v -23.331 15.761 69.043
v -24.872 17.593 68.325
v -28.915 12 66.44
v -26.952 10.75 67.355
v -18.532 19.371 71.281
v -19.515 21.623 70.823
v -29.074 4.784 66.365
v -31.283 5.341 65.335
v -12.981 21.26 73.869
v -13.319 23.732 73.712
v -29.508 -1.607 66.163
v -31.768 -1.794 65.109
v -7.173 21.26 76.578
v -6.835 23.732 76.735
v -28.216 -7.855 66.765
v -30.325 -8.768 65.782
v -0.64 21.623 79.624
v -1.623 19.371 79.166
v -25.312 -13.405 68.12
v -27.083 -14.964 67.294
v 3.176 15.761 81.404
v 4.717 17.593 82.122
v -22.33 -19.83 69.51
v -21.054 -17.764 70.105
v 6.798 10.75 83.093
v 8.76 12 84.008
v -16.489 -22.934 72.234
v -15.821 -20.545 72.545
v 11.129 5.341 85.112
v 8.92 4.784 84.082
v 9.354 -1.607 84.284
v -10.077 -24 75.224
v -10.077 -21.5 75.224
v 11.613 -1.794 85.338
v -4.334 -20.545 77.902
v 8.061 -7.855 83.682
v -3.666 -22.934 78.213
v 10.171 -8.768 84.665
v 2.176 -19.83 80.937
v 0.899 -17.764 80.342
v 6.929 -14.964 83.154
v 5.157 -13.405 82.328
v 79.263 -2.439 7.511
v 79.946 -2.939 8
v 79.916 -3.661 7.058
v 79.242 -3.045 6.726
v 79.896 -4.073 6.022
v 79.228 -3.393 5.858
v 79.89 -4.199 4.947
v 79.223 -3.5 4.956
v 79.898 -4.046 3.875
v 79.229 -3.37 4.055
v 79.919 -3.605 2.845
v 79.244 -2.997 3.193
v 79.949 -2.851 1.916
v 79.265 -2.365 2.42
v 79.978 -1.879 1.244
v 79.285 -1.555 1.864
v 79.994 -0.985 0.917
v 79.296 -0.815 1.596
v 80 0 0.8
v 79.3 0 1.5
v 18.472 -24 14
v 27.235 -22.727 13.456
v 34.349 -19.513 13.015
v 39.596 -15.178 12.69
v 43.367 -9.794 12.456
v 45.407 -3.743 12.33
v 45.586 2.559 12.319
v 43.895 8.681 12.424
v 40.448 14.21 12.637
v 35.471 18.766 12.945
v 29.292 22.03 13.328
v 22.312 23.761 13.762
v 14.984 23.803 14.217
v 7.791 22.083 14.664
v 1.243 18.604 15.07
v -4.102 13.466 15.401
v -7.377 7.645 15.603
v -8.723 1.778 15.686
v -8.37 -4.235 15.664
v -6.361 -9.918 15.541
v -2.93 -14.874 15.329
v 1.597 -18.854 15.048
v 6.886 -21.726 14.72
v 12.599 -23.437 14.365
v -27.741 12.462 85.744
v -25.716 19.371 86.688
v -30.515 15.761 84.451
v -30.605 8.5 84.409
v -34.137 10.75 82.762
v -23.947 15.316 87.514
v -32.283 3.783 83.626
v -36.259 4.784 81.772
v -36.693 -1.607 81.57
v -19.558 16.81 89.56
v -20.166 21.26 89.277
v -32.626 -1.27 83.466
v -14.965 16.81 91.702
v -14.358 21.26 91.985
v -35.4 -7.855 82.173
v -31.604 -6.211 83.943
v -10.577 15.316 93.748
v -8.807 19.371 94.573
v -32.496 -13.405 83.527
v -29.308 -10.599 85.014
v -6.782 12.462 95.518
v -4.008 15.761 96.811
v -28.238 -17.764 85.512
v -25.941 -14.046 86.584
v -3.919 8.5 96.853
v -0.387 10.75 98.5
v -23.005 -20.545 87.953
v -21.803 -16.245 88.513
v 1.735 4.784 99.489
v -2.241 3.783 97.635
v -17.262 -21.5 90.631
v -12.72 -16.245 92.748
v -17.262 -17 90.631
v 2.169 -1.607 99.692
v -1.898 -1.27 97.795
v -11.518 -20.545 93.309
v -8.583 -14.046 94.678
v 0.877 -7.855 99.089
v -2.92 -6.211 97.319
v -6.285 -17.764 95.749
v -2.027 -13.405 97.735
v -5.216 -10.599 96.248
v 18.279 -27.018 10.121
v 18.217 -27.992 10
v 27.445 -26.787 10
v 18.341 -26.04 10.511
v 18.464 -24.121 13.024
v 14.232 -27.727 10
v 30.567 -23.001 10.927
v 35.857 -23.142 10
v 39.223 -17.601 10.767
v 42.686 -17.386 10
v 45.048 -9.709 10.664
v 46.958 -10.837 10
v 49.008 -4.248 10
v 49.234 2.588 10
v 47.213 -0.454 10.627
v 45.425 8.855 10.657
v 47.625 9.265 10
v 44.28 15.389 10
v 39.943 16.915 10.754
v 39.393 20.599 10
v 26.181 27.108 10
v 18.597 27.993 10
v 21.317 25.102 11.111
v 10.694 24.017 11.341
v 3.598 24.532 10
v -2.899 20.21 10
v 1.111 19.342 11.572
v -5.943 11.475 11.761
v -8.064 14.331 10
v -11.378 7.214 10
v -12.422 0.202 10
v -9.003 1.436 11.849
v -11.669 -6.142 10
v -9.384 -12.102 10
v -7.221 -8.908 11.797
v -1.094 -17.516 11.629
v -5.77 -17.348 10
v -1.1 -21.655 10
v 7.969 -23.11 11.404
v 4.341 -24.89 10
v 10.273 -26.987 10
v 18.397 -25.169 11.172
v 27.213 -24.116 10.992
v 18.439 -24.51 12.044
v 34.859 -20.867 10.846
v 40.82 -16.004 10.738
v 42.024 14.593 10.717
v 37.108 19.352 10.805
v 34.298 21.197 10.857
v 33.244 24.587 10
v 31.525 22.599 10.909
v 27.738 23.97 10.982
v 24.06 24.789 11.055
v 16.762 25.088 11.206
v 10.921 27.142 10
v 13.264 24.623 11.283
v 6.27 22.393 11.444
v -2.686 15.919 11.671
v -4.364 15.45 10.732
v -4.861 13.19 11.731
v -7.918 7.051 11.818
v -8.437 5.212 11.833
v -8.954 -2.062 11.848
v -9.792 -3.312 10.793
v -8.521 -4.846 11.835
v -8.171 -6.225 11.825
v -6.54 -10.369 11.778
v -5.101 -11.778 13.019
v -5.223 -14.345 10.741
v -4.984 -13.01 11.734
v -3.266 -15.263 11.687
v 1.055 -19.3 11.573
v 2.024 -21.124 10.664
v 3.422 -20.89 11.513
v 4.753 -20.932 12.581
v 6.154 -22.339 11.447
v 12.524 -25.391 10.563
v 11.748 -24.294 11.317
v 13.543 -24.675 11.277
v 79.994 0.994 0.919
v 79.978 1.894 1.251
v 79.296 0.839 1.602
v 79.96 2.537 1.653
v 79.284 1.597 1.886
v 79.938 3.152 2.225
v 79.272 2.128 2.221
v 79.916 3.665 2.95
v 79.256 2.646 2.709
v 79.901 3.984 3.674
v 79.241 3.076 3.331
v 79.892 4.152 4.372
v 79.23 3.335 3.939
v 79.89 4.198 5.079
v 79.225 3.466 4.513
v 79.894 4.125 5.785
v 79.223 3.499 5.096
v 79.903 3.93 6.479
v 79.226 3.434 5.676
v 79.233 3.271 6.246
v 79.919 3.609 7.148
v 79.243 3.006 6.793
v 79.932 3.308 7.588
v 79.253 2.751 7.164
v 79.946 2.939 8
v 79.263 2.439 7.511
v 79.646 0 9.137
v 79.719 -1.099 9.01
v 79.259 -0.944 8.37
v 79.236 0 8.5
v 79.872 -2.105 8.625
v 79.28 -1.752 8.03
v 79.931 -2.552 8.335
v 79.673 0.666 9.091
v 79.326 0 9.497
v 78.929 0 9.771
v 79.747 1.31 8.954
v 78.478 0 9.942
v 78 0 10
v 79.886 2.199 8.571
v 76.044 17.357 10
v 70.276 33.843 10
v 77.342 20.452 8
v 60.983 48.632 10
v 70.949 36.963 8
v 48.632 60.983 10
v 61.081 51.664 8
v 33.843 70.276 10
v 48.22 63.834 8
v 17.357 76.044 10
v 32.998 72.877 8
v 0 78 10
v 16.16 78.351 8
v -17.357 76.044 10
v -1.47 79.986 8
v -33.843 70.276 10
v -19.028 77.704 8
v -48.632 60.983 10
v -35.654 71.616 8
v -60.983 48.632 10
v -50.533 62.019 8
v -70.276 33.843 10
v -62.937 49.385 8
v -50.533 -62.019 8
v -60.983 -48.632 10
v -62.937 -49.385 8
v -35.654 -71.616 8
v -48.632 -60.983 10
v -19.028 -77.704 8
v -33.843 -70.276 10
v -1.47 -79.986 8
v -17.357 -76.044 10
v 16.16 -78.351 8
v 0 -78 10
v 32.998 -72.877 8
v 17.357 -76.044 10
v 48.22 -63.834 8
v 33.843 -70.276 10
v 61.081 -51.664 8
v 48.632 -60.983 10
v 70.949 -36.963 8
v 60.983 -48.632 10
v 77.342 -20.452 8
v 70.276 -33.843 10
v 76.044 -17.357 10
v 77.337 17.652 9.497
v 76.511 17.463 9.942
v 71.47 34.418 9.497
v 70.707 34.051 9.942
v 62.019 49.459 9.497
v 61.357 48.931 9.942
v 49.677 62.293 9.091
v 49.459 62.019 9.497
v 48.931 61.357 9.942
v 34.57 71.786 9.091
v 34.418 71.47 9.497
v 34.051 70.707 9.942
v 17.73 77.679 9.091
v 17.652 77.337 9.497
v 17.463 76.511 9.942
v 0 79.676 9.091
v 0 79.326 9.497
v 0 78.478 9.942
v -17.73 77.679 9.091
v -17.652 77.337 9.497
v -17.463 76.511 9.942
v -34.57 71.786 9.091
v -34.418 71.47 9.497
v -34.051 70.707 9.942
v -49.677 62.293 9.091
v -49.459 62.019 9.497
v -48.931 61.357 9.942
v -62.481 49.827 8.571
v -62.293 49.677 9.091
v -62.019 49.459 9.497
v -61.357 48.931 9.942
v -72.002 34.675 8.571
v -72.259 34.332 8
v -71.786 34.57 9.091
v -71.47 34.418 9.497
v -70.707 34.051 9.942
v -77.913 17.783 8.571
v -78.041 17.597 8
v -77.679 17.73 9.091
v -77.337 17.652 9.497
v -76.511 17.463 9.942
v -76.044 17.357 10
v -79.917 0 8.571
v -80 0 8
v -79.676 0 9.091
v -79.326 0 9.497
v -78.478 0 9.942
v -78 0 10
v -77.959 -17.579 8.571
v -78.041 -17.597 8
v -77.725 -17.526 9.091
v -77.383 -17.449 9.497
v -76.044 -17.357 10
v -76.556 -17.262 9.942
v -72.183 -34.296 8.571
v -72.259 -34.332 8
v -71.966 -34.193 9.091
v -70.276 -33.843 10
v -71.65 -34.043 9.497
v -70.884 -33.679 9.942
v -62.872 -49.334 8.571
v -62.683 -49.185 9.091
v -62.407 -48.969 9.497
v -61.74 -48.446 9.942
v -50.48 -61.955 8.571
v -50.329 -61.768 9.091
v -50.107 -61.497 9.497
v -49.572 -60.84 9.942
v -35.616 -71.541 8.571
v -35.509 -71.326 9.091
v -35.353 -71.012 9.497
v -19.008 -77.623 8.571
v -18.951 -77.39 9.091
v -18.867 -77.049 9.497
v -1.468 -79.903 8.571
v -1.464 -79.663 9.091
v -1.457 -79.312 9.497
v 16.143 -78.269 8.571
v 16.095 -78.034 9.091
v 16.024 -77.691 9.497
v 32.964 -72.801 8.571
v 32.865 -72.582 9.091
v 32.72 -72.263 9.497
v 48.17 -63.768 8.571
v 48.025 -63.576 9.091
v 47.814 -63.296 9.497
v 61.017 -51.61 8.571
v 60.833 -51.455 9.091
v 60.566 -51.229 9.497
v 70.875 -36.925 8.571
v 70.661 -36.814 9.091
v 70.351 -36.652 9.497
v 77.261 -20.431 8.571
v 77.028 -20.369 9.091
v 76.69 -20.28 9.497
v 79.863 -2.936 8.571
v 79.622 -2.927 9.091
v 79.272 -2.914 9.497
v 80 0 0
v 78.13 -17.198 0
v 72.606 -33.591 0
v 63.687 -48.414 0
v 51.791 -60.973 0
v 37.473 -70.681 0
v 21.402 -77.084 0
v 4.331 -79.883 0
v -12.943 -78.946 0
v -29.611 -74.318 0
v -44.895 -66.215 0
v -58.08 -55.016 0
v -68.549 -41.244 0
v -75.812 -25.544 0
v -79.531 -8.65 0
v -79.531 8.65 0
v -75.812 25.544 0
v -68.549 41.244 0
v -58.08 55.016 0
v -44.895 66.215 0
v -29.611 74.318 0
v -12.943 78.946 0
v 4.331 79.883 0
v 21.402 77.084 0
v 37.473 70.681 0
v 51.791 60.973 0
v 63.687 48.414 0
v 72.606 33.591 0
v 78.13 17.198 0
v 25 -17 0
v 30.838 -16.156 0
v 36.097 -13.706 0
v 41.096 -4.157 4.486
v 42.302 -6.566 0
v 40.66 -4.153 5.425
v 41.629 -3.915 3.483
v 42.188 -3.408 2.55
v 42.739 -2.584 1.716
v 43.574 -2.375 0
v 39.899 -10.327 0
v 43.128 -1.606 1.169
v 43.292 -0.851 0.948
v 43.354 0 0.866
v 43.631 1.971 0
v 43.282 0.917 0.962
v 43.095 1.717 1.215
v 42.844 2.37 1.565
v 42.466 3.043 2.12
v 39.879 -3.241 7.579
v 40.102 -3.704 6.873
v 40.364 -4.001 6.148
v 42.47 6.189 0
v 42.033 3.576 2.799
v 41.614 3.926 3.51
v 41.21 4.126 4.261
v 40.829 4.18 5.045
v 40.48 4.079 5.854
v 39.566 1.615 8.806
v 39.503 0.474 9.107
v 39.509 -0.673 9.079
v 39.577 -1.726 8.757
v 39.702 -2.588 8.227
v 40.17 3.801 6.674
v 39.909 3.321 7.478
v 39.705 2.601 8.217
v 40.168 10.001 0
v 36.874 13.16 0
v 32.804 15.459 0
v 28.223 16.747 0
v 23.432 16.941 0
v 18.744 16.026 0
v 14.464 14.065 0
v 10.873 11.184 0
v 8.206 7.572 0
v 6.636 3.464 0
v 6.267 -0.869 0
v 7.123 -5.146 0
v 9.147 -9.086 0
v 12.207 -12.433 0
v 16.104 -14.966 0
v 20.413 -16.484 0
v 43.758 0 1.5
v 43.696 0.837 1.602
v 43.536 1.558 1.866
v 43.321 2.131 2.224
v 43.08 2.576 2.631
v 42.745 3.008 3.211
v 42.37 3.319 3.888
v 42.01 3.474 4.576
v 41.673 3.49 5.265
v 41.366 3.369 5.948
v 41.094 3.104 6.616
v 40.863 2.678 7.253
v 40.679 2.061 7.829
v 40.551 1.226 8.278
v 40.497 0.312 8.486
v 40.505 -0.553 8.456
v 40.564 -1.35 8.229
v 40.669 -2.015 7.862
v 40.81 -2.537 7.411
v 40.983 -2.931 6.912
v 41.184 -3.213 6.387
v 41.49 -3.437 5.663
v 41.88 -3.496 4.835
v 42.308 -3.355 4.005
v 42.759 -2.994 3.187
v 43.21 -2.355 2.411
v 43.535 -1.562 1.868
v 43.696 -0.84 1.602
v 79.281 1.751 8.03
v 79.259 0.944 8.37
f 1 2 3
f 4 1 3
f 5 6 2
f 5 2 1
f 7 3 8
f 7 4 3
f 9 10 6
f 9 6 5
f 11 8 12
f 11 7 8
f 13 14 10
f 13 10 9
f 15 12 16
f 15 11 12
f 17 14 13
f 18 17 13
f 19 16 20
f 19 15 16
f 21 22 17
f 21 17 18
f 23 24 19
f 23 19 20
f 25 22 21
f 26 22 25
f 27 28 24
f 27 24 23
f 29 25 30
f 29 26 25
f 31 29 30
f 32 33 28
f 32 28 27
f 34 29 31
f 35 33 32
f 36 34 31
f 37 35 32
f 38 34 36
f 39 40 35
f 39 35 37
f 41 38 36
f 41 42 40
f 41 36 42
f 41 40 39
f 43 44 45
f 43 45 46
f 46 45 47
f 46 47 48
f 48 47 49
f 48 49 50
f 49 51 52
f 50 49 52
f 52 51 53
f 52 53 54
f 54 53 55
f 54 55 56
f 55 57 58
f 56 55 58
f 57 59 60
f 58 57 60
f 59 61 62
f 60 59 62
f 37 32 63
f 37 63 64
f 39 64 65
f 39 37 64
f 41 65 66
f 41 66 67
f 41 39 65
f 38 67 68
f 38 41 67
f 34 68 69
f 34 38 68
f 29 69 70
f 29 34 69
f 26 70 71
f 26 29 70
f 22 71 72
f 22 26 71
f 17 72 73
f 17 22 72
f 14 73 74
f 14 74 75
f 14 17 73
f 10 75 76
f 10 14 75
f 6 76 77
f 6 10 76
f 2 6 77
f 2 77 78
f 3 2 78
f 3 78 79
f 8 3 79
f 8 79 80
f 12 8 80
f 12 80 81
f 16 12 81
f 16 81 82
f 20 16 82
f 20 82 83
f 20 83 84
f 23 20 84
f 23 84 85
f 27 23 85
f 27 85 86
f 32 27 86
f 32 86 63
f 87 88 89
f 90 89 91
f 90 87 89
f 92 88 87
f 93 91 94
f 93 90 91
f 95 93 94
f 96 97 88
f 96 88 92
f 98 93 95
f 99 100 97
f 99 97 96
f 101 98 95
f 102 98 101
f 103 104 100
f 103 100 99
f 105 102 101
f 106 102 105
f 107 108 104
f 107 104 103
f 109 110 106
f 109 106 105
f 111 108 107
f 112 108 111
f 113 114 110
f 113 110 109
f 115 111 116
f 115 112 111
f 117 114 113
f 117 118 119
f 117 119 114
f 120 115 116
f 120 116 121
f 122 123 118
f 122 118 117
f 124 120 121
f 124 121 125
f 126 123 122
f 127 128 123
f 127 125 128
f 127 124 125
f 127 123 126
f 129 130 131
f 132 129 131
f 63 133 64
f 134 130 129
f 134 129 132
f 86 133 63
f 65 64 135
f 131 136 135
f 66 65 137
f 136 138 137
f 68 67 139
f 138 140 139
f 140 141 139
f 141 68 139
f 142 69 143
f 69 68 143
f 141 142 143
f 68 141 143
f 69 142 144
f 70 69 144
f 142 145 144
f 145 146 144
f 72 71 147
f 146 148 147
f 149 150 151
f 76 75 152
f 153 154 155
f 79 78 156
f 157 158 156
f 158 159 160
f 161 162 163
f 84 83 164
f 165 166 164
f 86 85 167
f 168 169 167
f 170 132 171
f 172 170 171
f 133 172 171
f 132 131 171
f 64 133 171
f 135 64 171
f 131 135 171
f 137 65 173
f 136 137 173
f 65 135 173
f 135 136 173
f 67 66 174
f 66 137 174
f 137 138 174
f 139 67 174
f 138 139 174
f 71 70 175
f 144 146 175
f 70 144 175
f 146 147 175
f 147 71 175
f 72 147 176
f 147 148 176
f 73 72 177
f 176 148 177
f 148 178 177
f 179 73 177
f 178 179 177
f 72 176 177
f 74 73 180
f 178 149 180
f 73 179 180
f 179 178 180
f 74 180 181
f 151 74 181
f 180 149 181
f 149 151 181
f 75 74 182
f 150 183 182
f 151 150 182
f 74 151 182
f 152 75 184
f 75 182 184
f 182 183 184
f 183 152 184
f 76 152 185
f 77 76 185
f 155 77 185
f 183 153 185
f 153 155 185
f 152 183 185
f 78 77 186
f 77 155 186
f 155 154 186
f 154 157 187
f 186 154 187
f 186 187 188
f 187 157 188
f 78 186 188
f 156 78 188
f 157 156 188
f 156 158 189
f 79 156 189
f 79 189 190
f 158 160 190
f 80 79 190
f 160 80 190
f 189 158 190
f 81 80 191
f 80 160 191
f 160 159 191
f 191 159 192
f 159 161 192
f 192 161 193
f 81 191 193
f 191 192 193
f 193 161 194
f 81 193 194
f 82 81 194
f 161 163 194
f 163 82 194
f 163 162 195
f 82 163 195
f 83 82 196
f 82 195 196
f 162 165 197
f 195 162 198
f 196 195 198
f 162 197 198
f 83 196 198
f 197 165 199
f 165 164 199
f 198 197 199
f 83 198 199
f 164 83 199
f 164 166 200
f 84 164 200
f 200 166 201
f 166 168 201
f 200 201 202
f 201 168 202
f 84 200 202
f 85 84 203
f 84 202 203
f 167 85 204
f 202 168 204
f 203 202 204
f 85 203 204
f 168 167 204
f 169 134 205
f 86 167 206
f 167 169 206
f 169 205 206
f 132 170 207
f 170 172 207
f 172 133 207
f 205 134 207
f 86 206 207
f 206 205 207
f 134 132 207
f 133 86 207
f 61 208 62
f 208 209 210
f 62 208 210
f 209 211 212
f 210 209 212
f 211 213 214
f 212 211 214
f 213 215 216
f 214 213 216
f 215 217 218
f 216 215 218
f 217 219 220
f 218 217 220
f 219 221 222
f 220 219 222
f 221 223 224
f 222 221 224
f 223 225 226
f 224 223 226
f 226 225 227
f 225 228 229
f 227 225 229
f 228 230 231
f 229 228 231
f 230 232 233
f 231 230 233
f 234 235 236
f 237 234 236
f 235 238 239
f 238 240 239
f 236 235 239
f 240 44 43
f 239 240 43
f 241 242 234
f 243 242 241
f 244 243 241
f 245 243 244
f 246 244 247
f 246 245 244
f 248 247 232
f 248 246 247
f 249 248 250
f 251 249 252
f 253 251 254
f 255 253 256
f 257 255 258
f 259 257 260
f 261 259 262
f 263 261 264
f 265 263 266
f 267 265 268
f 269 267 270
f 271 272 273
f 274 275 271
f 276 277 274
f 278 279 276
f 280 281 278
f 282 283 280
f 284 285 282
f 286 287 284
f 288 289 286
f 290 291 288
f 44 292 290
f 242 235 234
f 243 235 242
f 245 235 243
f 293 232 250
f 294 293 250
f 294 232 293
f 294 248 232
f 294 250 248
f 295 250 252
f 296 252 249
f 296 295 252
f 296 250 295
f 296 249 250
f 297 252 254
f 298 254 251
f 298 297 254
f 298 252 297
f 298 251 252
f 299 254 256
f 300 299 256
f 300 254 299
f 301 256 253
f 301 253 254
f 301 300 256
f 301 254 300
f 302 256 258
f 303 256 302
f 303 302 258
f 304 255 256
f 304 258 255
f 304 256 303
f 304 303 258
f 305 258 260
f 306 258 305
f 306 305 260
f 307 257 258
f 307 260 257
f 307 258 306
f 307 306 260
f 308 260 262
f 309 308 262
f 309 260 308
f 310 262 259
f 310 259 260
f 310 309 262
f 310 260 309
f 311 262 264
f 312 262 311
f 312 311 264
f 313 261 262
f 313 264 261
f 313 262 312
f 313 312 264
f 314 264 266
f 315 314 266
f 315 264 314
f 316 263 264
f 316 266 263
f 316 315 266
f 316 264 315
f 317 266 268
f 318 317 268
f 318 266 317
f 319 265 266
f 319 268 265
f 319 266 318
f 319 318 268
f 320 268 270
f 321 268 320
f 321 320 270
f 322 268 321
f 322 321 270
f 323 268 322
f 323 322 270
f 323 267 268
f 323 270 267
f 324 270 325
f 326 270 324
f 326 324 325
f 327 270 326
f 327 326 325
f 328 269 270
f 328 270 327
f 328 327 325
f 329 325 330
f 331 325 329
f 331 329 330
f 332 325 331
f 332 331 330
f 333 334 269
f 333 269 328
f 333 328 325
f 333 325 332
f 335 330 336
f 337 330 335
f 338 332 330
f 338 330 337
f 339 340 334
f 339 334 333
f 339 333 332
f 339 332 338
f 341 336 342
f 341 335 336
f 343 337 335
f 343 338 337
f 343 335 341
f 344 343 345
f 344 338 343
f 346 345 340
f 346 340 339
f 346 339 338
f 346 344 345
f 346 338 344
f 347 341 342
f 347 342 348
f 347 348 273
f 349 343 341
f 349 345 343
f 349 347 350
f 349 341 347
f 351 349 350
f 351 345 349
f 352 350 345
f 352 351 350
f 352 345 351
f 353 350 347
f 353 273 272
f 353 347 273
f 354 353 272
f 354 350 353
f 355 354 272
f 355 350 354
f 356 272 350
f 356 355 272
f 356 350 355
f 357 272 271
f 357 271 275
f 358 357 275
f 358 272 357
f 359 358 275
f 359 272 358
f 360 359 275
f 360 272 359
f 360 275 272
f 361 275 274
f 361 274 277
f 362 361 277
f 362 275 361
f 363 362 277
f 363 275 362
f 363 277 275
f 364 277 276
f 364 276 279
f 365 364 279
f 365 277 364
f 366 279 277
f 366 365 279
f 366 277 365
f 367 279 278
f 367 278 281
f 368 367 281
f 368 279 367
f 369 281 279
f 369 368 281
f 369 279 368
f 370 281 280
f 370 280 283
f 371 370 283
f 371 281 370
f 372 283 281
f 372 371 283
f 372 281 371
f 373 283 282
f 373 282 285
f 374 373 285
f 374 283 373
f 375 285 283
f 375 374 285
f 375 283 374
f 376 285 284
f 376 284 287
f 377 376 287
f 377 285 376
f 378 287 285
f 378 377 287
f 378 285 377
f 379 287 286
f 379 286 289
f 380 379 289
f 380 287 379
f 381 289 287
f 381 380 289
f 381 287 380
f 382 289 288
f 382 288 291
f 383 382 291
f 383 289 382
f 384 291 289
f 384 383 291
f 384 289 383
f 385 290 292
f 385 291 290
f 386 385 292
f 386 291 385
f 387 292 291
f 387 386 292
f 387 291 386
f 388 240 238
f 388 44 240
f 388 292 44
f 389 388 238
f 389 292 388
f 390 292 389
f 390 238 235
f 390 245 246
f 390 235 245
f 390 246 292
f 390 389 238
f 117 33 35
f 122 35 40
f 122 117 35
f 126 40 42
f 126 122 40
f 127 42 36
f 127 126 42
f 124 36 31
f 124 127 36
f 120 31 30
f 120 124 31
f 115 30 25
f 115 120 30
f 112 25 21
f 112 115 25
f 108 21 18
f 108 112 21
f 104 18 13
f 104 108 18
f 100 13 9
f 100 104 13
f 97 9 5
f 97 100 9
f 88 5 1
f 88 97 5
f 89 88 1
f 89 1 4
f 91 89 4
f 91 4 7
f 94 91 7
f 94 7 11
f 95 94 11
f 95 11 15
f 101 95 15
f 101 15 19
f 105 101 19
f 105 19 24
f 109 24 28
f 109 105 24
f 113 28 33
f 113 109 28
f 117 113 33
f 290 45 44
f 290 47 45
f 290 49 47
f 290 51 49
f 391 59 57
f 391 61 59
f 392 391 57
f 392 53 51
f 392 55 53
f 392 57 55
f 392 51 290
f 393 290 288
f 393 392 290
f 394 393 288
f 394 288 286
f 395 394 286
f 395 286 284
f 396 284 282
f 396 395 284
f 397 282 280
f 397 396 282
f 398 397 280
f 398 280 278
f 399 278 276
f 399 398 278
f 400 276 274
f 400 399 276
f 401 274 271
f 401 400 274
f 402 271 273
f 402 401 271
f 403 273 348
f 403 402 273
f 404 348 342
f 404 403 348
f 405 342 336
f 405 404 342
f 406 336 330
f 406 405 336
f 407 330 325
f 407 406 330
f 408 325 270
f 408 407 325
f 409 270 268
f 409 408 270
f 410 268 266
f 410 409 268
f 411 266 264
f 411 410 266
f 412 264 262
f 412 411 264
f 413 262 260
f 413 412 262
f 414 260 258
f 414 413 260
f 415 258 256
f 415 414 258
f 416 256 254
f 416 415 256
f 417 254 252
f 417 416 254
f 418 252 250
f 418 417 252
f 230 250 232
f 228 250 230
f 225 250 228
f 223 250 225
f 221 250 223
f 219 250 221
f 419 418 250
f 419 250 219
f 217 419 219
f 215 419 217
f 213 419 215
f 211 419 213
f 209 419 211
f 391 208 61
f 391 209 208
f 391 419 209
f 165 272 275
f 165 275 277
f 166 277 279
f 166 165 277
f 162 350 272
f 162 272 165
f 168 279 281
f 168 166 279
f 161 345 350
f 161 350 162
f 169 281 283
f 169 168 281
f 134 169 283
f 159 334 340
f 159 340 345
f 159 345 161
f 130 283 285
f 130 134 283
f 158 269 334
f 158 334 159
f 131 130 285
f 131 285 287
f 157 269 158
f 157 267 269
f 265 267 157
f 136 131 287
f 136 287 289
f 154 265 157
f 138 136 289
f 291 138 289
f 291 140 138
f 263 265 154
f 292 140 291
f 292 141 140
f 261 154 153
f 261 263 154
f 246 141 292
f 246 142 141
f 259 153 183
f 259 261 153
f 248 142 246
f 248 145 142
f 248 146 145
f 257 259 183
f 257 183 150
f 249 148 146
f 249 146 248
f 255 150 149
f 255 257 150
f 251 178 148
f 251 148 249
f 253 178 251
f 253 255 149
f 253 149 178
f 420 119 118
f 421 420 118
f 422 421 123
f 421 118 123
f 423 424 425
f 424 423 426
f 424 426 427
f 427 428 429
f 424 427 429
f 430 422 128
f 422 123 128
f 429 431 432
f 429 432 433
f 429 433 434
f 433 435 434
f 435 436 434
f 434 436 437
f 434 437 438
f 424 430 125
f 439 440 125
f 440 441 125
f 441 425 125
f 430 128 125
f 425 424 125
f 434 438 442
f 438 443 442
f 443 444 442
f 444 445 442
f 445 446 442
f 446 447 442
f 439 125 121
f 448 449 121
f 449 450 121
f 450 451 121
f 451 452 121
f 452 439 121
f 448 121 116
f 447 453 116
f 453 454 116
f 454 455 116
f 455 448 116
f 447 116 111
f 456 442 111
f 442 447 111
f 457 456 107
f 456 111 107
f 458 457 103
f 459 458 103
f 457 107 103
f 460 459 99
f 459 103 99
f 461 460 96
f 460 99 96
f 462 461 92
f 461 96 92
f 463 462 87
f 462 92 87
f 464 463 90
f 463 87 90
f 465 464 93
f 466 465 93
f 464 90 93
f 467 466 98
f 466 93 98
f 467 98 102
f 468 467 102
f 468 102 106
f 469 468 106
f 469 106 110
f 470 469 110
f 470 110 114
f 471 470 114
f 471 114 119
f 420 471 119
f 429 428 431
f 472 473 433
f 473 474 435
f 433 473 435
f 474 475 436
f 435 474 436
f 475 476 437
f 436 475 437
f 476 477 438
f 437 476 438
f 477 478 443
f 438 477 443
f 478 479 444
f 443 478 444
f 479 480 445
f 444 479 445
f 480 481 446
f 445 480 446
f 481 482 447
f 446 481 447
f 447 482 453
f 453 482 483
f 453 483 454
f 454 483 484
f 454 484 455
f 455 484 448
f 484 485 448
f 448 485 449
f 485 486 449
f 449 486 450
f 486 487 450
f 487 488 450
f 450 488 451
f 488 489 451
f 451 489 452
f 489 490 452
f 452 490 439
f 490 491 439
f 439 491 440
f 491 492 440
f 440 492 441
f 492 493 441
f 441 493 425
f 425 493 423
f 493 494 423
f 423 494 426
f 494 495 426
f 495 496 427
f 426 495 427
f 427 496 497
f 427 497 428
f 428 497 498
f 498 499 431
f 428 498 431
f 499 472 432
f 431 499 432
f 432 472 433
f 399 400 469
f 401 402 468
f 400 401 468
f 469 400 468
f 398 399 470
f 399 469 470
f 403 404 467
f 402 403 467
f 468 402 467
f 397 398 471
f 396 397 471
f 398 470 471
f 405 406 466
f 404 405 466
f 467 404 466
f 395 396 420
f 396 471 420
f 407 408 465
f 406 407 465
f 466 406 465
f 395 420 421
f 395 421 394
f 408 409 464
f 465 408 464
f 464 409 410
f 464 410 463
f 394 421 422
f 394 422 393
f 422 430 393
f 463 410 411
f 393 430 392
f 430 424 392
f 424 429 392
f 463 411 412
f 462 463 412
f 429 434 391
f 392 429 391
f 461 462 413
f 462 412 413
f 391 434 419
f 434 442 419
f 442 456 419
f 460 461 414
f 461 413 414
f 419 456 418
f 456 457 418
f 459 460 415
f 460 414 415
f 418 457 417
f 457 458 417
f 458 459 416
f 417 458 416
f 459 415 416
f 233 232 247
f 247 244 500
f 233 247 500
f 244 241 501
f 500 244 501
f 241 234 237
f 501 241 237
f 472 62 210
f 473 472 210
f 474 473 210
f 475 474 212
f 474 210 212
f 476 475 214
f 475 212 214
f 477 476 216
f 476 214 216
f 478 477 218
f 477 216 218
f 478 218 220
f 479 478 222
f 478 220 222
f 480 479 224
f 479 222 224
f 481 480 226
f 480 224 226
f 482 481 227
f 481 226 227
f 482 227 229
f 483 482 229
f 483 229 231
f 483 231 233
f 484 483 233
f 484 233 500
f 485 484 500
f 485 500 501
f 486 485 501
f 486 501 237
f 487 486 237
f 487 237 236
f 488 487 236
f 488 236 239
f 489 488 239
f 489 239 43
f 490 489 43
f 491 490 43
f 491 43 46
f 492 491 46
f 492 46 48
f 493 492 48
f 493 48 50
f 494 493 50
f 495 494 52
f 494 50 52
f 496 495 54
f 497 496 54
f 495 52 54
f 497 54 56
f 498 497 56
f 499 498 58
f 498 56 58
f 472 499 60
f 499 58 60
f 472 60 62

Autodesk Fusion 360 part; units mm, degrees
sketch "Skizze13" plane through (0, 0, 0) normal (0, 0, 1) x (1, 0, 0)
  circle A0 centre (0, 0) radius 80
extrude "Extrusion17" add sketch "Skizze13" along normal blind 10 makes body 1
fillet "Abrundung5" radius 2 1 edges at (-74.5862, -28.9292, 10) on bodies 1
sketch "Skizze14" plane through (0, 0, 0) normal (0, 1, 0) x (1, 0, 0)
  line L0 (25, 0) -> (-17.2618, -90.6308) construction
ref_plane "Arbeitsebene5" through (-17.2618, 0, 90.6308) normal (-0.4226, 0, 0.9063) x (0, -1, 0)
sketch "Skizze15" plane through (-17.2618, 0, 90.6308) normal (-0.4226, 0, 0.9063) x (0, -1, 0)
  circle A0 centre (0, 0) radius 24
  circle A1 centre (0, 0) radius 21.5
extrude "Extrusion20" add sketch "Skizze15" against normal blind 110 separate body contours A0 | A1 makes body 2
combine "Kombinieren3" operation add target body 1 tool bodies 2
extrude "Extrusion21" cut sketch "Skizze15" against normal blind 17 bodies 1
fillet "Abrundung6" radius 4 1 edges at (46.818, 0, 10) on bodies 1
sketch "Skizze16" plane through (-17.2618, 0, 90.6308) normal (-0.4226, 0, 0.9063) x (0, -1, 0)
  circle A0 centre (0, 0) radius 17
extrude "Extrusion22" cut sketch "Skizze16" against normal blind 160 bodies 1
sketch "Skizze17" plane through (0, 0, 0) normal (0, 0, 1) x (1, 0, 0)
  circle A0 centre (0, 0) radius 160
extrude "Extrusion23" cut sketch "Skizze17" against normal blind 110 bodies 1
ref_plane "Arbeitsebene6" through (90, 0, 0) normal (1, 0, 0) x (0, 1, 0)
sketch "Skizze18" plane through (90, 0, 0) normal (1, 0, 0) x (0, 0, -1)
  circle A0 centre (-5, 0) radius 3.5
extrude "Extrusion24" cut sketch "Skizze18" against normal blind 70 bodies 1
chamfer "Fase3" distance 0.7 angle 45 3 edges at (41.122, -3.4937, 4.7932) (79.9365, 0.0176, 8.5) (80, 0, 1.5) on bodies 1
equation "base_plate_diameter = 160 mm"
equation "base_plate_height = 10 mm"
equation "base_plate_rounding = 2 mm"
equation "arm_outer_diameter = 48 mm"
equation "ring_inner_diameter = 43 mm"
equation "ring_extrude_depth = 17 mm"
equation "foot_leg_bore_diameter = 34 mm"
equation "leg_length = 100 mm"
equation "leg_angle = 115 deg"
equation "leg_offset = 25 mm"
equation "leg_plate_rounding = 4 mm"
equation "cable_hole_offset = 90 mm"
equation "cable_hole_depth = 70 mm"
equation "cable_hole_diameter = 7 mm"
equation "cable_hole_height = 5.0 mm"
equation "cable_hole_chamfer = 0.7 mm"
equation "d81 = base_plate_height"
equation "d84 = base_plate_rounding"
equation "d95 = leg_plate_rounding"
equation "d96 = -leg_length - base_plate_height - 50 mm"
equation "d104 = cable_hole_chamfer"
